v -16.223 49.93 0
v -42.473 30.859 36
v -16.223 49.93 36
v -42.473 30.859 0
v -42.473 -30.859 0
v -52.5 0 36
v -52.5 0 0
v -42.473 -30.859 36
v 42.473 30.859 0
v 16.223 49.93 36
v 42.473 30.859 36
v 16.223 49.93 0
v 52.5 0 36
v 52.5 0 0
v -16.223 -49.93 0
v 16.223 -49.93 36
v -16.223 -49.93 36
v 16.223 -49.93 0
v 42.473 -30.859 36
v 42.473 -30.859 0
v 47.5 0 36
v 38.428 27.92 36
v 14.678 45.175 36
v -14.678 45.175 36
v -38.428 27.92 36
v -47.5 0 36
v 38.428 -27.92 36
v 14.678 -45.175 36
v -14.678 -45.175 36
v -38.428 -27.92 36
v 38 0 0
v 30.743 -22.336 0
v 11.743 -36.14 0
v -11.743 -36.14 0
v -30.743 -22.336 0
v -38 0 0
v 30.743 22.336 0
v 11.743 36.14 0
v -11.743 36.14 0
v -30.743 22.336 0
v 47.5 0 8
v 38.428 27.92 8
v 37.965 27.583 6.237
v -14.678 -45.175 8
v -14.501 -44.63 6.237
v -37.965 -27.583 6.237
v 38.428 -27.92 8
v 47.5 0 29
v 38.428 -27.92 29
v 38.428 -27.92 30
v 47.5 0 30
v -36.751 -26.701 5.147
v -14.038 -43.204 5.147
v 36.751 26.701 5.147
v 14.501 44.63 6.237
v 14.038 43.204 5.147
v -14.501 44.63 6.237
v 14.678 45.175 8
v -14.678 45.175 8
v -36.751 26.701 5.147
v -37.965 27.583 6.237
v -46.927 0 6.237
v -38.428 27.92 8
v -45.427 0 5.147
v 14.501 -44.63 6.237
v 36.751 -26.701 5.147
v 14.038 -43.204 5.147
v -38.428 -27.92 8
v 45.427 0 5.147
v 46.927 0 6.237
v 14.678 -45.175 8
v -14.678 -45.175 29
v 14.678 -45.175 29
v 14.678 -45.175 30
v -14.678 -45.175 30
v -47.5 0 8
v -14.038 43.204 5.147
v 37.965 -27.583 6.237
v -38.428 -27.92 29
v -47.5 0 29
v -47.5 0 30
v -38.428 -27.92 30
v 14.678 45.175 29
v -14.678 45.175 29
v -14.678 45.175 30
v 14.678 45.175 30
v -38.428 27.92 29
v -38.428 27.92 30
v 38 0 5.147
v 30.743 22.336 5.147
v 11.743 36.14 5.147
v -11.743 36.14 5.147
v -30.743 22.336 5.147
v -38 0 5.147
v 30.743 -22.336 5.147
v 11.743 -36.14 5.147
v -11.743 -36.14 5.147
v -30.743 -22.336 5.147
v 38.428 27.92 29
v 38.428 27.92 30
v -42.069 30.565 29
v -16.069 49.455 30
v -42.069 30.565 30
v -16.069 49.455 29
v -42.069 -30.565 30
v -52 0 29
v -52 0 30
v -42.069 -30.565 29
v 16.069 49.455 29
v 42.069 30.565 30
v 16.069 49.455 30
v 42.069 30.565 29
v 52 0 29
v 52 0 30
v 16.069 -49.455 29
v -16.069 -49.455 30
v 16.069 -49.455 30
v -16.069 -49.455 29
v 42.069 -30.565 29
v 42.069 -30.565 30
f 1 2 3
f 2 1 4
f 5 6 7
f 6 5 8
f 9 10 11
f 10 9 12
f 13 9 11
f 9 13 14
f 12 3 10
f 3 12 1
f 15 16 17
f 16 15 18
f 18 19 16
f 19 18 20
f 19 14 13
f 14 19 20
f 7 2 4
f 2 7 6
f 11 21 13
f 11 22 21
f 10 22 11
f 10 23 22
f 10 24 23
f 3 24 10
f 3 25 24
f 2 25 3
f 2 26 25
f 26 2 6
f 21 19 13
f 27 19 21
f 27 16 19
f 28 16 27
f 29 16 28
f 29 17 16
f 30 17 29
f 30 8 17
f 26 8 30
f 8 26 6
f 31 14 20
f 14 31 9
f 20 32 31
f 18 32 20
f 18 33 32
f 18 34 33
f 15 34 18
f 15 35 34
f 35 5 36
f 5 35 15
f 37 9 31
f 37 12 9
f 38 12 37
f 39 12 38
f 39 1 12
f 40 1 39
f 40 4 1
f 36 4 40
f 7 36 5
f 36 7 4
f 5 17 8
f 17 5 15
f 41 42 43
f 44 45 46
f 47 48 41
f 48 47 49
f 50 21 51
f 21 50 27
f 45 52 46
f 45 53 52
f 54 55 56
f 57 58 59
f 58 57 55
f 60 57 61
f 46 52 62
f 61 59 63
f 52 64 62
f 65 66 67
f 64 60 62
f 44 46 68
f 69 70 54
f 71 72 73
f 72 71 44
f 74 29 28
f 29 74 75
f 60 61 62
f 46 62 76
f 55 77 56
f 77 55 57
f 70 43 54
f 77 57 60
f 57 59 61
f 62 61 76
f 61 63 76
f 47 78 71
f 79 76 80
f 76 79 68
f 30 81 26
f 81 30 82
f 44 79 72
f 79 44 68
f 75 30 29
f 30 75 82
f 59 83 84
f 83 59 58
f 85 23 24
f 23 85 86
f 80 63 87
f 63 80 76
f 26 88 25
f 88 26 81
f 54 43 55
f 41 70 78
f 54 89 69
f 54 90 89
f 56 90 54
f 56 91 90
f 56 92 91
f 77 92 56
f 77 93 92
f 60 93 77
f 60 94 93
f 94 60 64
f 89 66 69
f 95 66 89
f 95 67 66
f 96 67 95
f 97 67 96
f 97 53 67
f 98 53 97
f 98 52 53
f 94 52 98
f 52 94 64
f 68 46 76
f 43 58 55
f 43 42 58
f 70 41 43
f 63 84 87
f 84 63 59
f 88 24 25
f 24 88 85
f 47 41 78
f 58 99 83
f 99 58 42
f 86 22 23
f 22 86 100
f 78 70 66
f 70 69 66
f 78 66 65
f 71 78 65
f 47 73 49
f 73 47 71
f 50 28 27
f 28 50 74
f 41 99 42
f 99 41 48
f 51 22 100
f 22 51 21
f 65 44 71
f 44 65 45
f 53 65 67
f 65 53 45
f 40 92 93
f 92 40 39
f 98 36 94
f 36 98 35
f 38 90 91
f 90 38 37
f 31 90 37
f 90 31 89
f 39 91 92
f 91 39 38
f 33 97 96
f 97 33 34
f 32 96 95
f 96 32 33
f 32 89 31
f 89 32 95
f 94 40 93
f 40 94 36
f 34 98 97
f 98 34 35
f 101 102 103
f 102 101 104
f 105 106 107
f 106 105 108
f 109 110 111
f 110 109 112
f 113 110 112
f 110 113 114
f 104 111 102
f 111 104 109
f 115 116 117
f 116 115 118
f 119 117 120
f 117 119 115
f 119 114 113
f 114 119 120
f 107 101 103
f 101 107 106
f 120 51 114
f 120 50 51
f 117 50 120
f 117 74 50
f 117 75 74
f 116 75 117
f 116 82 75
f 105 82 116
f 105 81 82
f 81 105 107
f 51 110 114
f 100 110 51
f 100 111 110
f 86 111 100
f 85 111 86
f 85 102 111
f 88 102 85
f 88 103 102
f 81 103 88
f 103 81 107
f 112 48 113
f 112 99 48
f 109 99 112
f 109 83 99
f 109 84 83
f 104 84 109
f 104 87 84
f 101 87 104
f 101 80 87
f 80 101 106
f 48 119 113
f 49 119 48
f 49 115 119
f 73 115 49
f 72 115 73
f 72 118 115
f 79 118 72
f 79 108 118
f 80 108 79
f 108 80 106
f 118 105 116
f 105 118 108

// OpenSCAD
// file: constants.scad
$fn = 10;

burger_diameter = 100; // ~ 4in
burger_thickness = 20; // ~ 3/4ths inch
//
//
edge_rounding = 3;
//
wall_thickness = 5; // mm
//
insert_thickness = 4;
insert_lip = 3;
insert_diameter = burger_diameter-(3*(wall_thickness+edge_rounding));
//
press_disc_thickness = 5;

mold_height = press_disc_thickness + insert_thickness + (1.35*burger_thickness);
//
part_mating_fudge = -2; // subtract 2mm from objects that fit inside other objects.

press_support_pillars = 7;

module rcylinder(r1=10,r2=10,h=10,b=2) {
  translate([0,0,-h/2]) hull() {
    rotate_extrude() translate([r1-b,b,0]) circle(r = b); 
    rotate_extrude() translate([r2-b, h-b, 0]) circle(r = b);
  }
}
// main file
include <constants.scad>

main();

module main() {
  difference() {
    difference() {
      difference() {
	translate([0,0,0]) color("green") outside();
	translate([0,0,(mold_height/2)+wall_thickness]) color("red") inside();
      }
      translate([0,0,-1]) color("blue") inlay_cutout();
    }
    translate([0,0,burger_thickness+press_disc_thickness+insert_thickness]) color("black") fill_line();
  }
}


module fill_line() {
  cylinder(h = 1, r = 2+(burger_diameter/2));
}

module inlay_cutout() {
  cylinder(h = mold_height, r = insert_diameter/2);
}

module inside() {
  rcylinder(r1 = (burger_diameter-wall_thickness)/2, r2 = (burger_diameter-wall_thickness)/2, h = mold_height, b=edge_rounding);
}

module outside() {
  cylinder(h = mold_height, r = (burger_diameter+wall_thickness)/2);
}
